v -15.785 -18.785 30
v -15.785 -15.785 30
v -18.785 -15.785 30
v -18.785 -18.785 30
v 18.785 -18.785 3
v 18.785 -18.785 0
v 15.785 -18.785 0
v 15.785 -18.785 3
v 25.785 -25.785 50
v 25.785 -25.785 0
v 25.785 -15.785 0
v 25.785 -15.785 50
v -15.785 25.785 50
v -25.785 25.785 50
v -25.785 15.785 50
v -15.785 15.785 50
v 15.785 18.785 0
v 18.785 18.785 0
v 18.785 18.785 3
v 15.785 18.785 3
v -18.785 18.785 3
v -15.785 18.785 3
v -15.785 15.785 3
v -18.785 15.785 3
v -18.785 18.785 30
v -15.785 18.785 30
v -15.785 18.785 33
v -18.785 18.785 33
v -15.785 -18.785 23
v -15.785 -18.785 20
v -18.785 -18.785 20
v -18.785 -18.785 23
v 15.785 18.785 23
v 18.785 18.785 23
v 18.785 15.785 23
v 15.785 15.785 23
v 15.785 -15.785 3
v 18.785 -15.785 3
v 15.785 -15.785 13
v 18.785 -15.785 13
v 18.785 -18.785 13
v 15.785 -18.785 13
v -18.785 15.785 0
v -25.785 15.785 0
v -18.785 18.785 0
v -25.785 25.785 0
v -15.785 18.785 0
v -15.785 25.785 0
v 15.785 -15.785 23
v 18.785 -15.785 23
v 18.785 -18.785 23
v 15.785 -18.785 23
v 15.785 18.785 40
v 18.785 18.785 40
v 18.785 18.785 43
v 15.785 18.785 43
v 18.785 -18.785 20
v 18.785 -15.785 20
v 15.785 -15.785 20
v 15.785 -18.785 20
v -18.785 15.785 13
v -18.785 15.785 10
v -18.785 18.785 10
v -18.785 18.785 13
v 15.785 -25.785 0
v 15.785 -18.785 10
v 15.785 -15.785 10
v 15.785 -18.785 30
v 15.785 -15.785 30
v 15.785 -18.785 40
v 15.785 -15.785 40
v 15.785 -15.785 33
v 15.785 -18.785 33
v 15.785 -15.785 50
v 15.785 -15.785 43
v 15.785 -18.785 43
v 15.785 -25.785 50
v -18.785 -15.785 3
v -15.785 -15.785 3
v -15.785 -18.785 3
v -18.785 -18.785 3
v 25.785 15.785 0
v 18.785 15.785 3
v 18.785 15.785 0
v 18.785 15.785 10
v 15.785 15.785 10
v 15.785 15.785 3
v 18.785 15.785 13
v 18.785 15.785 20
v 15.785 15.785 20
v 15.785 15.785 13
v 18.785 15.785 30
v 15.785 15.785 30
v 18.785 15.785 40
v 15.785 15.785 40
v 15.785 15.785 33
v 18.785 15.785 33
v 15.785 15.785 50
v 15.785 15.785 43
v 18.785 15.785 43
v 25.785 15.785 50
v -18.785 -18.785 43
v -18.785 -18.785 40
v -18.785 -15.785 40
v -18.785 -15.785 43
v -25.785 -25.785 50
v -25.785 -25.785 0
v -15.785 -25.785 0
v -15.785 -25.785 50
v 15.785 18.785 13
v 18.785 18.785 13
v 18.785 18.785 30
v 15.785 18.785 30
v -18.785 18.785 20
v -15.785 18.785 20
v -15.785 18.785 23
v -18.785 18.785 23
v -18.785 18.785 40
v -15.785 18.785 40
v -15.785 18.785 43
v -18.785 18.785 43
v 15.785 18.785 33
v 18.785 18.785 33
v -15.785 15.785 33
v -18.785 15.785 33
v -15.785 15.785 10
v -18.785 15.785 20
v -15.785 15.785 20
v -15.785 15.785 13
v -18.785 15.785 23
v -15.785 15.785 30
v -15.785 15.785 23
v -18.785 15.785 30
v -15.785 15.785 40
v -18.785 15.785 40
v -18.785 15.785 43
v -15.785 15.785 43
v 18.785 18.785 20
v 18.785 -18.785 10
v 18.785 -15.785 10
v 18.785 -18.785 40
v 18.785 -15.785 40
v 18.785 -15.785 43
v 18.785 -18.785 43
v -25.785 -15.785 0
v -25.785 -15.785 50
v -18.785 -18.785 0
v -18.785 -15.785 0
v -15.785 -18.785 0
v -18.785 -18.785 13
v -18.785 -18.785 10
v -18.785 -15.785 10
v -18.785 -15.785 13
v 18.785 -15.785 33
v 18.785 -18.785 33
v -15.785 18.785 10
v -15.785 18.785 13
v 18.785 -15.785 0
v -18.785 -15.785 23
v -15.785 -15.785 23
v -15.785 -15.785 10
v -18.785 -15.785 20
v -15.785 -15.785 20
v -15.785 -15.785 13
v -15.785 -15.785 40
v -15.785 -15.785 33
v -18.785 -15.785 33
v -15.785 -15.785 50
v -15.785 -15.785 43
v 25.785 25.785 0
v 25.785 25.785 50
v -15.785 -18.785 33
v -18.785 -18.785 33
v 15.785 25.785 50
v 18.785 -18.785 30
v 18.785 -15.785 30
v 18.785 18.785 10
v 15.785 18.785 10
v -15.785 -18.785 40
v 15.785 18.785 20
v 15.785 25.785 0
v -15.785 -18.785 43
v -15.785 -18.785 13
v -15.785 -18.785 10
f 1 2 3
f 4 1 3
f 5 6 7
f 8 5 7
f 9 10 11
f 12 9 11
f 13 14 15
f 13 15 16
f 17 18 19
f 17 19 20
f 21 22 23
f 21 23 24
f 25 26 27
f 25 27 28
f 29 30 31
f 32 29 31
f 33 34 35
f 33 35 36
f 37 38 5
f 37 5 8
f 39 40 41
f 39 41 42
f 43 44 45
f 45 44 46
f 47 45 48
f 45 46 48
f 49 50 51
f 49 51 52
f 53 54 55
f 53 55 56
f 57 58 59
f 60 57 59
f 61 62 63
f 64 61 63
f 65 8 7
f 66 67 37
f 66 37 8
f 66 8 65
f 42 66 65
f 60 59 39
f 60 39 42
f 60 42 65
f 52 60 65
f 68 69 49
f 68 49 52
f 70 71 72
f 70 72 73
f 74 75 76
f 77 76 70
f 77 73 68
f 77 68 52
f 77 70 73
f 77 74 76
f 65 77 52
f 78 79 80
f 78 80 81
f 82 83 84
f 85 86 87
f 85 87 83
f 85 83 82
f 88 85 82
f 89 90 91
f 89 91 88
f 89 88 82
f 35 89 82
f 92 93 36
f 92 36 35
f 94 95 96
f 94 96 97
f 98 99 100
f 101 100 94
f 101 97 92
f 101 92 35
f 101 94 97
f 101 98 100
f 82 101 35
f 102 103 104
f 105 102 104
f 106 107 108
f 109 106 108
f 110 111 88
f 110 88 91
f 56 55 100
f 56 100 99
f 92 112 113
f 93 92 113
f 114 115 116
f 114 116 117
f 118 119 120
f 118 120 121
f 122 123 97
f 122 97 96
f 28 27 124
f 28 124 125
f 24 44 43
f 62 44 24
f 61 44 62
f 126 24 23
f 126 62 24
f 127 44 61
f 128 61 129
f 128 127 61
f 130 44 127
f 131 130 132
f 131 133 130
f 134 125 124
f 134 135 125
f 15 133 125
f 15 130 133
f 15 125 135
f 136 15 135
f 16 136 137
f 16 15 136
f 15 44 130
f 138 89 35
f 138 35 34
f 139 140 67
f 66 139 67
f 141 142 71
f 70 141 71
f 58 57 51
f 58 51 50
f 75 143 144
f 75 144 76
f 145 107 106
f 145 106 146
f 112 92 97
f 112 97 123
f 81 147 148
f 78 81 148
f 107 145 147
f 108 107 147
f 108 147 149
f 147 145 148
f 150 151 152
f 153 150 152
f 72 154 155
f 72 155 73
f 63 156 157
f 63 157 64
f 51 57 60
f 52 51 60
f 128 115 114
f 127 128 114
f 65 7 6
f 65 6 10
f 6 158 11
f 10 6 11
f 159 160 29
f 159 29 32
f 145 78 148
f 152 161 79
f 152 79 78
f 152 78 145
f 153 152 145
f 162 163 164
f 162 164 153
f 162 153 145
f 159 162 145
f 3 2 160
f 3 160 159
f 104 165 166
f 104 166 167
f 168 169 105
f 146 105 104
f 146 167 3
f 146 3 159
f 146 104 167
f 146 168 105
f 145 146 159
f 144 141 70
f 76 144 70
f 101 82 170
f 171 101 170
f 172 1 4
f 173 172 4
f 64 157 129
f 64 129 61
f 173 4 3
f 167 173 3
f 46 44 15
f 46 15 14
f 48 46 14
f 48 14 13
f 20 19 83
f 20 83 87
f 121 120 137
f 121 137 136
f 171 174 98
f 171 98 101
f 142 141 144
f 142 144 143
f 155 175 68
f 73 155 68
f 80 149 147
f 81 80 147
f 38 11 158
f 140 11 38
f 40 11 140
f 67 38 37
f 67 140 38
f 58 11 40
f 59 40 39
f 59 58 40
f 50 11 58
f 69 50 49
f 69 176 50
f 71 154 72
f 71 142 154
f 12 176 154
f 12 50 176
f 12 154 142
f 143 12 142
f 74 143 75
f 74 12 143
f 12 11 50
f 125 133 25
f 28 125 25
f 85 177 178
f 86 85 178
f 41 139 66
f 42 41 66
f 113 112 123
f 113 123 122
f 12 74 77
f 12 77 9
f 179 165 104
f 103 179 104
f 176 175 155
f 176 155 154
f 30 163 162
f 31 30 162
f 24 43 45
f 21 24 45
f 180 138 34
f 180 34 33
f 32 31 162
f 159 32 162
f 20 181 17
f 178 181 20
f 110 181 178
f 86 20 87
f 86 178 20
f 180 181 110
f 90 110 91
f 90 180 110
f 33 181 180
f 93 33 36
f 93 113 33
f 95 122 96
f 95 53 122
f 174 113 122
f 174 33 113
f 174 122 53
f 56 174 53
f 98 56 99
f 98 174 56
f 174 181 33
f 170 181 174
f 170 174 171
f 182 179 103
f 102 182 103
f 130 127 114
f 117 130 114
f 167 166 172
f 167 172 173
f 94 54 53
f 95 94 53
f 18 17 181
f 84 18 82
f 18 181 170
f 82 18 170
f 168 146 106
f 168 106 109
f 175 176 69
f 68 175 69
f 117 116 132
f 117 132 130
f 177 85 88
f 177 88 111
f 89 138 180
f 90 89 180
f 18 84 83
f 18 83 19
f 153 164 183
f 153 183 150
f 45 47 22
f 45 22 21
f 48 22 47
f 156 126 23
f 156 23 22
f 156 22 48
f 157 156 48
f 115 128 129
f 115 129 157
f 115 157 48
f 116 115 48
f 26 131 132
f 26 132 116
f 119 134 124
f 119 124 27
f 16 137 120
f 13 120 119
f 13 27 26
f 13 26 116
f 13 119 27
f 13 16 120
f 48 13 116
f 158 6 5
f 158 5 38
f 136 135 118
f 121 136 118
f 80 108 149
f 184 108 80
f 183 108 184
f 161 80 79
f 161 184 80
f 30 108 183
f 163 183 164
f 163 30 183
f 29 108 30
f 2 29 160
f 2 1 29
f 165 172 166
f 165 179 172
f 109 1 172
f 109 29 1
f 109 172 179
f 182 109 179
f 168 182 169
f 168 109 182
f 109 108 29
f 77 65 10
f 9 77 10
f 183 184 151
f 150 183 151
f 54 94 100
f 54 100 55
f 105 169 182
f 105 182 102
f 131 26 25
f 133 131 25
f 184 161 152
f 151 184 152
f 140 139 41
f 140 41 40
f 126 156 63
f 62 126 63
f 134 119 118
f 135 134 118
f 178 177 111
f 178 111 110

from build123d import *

# Parameters (mm, degrees)
ESQUISSE1_W                = 51.57
ESQUISSE1_H                = 51.57
BOSS_EXTRU_1_DEPTH         = 50
ENL_V_MAT_EXTRU_1_DEPTH    = 50
ESQUISSE3_W                = 37.57
ESQUISSE3_H                = 37.57
ENL_V_MAT_EXTRU_2_DEPTH    = 3
R_P_TITION_LIN_AIRE1_COUNT = 13
R_P_TITION_LIN_AIRE1_PITCH = 10


with BuildPart() as part:
    # Esquisse1 → Boss.-Extru.1 (new body)
    with BuildSketch(Plane.XY):
        Rectangle(ESQUISSE1_W, ESQUISSE1_H)
    extrude(amount=BOSS_EXTRU_1_DEPTH)

    # Esquisse2 → Enlèv. mat.-Extru.1 (cut)
    with BuildSketch(Plane.XY.offset(50)):
        Polygon((-25.785, 15.785), (-15.785, 15.785), (-15.785, 25.785), (15.785, 25.785), (15.785, 15.785), (25.785, 15.785), (25.785, -15.785), (15.785, -15.785), (15.785, -25.785), (-15.785, -25.785), (-15.785, -15.785), (-25.785, -15.785), align=None)
    extrude(amount=-ENL_V_MAT_EXTRU_1_DEPTH, mode=Mode.SUBTRACT)


with BuildPart() as enl_v_mat_extru_1_piece_1:
    # of the separate pieces the step leaves, piece 1, a body of its own (enl_v_mat_extru_1_pieces)
    add(part.part.solids().sort_by_distance((-25.785, 25.785, 0))[0])


with BuildPart() as enl_v_mat_extru_1_piece_2:
    # of the separate pieces the step leaves, piece 2, a body of its own (enl_v_mat_extru_1_pieces)
    add(part.part.solids().sort_by_distance((25.785, -15.785, 0))[0])


with BuildPart() as enl_v_mat_extru_1_piece_3:
    # of the separate pieces the step leaves, piece 3, a body of its own (enl_v_mat_extru_1_pieces)
    add(part.part.solids().sort_by_distance((-25.785, -25.785, 0))[0])


with BuildPart() as enl_v_mat_extru_1_piece_4:
    # of the separate pieces the step leaves, piece 4, a body of its own (enl_v_mat_extru_1_pieces)
    add(part.part.solids().sort_by_distance((15.785, 25.785, 0))[0])


with BuildPart() as enl_v_mat_extru_2_tool:
    # Esquisse3 → Enlèv. mat.-Extru.2 (new body)
    with BuildSketch(Plane(origin=(0, 0, 0), x_dir=(-1, 0, 0), z_dir=(0, 0, -1))):
        Rectangle(ESQUISSE3_W, ESQUISSE3_H)
    enl_v_mat_extru_2 = extrude(amount=-ENL_V_MAT_EXTRU_2_DEPTH)


with BuildPart() as enl_v_mat_extru_1_piece_1_1:
    add(enl_v_mat_extru_1_piece_1.part)

    # Enlèv. mat.-Extru.2: cut by enl_v_mat_extru_2_tool
    add(enl_v_mat_extru_2_tool.part, mode=Mode.SUBTRACT)


with BuildPart() as enl_v_mat_extru_1_piece_2_1:
    add(enl_v_mat_extru_1_piece_2.part)

    # Enlèv. mat.-Extru.2: cut by enl_v_mat_extru_2_tool
    add(enl_v_mat_extru_2_tool.part, mode=Mode.SUBTRACT)


with BuildPart() as enl_v_mat_extru_1_piece_3_1:
    add(enl_v_mat_extru_1_piece_3.part)

    # Enlèv. mat.-Extru.2: cut by enl_v_mat_extru_2_tool
    add(enl_v_mat_extru_2_tool.part, mode=Mode.SUBTRACT)


with BuildPart() as enl_v_mat_extru_1_piece_4_1:
    add(enl_v_mat_extru_1_piece_4.part)

    # Enlèv. mat.-Extru.2: cut by enl_v_mat_extru_2_tool
    add(enl_v_mat_extru_2_tool.part, mode=Mode.SUBTRACT)


with BuildPart() as r_p_tition_lin_aire1_tool:
    # Répétition linéaire1: Enlèv. mat.-Extru.2 ×13
    with Locations(*[(0, 0, i * R_P_TITION_LIN_AIRE1_PITCH) for i in range(1, R_P_TITION_LIN_AIRE1_COUNT)]):
        add(enl_v_mat_extru_2)


with BuildPart() as enl_v_mat_extru_1_piece_1_2:
    add(enl_v_mat_extru_1_piece_1_1.part)

    # Répétition linéaire1: cut by r_p_tition_lin_aire1_tool
    add(r_p_tition_lin_aire1_tool.part, mode=Mode.SUBTRACT)


with BuildPart() as enl_v_mat_extru_1_piece_2_2:
    add(enl_v_mat_extru_1_piece_2_1.part)

    # Répétition linéaire1: cut by r_p_tition_lin_aire1_tool
    add(r_p_tition_lin_aire1_tool.part, mode=Mode.SUBTRACT)


with BuildPart() as enl_v_mat_extru_1_piece_3_2:
    add(enl_v_mat_extru_1_piece_3_1.part)

    # Répétition linéaire1: cut by r_p_tition_lin_aire1_tool
    add(r_p_tition_lin_aire1_tool.part, mode=Mode.SUBTRACT)


with BuildPart() as enl_v_mat_extru_1_piece_4_2:
    add(enl_v_mat_extru_1_piece_4_1.part)

    # Répétition linéaire1: cut by r_p_tition_lin_aire1_tool
    add(r_p_tition_lin_aire1_tool.part, mode=Mode.SUBTRACT)


solid = Compound([enl_v_mat_extru_1_piece_1_2.part, enl_v_mat_extru_1_piece_2_2.part, enl_v_mat_extru_1_piece_3_2.part, enl_v_mat_extru_1_piece_4_2.part])
